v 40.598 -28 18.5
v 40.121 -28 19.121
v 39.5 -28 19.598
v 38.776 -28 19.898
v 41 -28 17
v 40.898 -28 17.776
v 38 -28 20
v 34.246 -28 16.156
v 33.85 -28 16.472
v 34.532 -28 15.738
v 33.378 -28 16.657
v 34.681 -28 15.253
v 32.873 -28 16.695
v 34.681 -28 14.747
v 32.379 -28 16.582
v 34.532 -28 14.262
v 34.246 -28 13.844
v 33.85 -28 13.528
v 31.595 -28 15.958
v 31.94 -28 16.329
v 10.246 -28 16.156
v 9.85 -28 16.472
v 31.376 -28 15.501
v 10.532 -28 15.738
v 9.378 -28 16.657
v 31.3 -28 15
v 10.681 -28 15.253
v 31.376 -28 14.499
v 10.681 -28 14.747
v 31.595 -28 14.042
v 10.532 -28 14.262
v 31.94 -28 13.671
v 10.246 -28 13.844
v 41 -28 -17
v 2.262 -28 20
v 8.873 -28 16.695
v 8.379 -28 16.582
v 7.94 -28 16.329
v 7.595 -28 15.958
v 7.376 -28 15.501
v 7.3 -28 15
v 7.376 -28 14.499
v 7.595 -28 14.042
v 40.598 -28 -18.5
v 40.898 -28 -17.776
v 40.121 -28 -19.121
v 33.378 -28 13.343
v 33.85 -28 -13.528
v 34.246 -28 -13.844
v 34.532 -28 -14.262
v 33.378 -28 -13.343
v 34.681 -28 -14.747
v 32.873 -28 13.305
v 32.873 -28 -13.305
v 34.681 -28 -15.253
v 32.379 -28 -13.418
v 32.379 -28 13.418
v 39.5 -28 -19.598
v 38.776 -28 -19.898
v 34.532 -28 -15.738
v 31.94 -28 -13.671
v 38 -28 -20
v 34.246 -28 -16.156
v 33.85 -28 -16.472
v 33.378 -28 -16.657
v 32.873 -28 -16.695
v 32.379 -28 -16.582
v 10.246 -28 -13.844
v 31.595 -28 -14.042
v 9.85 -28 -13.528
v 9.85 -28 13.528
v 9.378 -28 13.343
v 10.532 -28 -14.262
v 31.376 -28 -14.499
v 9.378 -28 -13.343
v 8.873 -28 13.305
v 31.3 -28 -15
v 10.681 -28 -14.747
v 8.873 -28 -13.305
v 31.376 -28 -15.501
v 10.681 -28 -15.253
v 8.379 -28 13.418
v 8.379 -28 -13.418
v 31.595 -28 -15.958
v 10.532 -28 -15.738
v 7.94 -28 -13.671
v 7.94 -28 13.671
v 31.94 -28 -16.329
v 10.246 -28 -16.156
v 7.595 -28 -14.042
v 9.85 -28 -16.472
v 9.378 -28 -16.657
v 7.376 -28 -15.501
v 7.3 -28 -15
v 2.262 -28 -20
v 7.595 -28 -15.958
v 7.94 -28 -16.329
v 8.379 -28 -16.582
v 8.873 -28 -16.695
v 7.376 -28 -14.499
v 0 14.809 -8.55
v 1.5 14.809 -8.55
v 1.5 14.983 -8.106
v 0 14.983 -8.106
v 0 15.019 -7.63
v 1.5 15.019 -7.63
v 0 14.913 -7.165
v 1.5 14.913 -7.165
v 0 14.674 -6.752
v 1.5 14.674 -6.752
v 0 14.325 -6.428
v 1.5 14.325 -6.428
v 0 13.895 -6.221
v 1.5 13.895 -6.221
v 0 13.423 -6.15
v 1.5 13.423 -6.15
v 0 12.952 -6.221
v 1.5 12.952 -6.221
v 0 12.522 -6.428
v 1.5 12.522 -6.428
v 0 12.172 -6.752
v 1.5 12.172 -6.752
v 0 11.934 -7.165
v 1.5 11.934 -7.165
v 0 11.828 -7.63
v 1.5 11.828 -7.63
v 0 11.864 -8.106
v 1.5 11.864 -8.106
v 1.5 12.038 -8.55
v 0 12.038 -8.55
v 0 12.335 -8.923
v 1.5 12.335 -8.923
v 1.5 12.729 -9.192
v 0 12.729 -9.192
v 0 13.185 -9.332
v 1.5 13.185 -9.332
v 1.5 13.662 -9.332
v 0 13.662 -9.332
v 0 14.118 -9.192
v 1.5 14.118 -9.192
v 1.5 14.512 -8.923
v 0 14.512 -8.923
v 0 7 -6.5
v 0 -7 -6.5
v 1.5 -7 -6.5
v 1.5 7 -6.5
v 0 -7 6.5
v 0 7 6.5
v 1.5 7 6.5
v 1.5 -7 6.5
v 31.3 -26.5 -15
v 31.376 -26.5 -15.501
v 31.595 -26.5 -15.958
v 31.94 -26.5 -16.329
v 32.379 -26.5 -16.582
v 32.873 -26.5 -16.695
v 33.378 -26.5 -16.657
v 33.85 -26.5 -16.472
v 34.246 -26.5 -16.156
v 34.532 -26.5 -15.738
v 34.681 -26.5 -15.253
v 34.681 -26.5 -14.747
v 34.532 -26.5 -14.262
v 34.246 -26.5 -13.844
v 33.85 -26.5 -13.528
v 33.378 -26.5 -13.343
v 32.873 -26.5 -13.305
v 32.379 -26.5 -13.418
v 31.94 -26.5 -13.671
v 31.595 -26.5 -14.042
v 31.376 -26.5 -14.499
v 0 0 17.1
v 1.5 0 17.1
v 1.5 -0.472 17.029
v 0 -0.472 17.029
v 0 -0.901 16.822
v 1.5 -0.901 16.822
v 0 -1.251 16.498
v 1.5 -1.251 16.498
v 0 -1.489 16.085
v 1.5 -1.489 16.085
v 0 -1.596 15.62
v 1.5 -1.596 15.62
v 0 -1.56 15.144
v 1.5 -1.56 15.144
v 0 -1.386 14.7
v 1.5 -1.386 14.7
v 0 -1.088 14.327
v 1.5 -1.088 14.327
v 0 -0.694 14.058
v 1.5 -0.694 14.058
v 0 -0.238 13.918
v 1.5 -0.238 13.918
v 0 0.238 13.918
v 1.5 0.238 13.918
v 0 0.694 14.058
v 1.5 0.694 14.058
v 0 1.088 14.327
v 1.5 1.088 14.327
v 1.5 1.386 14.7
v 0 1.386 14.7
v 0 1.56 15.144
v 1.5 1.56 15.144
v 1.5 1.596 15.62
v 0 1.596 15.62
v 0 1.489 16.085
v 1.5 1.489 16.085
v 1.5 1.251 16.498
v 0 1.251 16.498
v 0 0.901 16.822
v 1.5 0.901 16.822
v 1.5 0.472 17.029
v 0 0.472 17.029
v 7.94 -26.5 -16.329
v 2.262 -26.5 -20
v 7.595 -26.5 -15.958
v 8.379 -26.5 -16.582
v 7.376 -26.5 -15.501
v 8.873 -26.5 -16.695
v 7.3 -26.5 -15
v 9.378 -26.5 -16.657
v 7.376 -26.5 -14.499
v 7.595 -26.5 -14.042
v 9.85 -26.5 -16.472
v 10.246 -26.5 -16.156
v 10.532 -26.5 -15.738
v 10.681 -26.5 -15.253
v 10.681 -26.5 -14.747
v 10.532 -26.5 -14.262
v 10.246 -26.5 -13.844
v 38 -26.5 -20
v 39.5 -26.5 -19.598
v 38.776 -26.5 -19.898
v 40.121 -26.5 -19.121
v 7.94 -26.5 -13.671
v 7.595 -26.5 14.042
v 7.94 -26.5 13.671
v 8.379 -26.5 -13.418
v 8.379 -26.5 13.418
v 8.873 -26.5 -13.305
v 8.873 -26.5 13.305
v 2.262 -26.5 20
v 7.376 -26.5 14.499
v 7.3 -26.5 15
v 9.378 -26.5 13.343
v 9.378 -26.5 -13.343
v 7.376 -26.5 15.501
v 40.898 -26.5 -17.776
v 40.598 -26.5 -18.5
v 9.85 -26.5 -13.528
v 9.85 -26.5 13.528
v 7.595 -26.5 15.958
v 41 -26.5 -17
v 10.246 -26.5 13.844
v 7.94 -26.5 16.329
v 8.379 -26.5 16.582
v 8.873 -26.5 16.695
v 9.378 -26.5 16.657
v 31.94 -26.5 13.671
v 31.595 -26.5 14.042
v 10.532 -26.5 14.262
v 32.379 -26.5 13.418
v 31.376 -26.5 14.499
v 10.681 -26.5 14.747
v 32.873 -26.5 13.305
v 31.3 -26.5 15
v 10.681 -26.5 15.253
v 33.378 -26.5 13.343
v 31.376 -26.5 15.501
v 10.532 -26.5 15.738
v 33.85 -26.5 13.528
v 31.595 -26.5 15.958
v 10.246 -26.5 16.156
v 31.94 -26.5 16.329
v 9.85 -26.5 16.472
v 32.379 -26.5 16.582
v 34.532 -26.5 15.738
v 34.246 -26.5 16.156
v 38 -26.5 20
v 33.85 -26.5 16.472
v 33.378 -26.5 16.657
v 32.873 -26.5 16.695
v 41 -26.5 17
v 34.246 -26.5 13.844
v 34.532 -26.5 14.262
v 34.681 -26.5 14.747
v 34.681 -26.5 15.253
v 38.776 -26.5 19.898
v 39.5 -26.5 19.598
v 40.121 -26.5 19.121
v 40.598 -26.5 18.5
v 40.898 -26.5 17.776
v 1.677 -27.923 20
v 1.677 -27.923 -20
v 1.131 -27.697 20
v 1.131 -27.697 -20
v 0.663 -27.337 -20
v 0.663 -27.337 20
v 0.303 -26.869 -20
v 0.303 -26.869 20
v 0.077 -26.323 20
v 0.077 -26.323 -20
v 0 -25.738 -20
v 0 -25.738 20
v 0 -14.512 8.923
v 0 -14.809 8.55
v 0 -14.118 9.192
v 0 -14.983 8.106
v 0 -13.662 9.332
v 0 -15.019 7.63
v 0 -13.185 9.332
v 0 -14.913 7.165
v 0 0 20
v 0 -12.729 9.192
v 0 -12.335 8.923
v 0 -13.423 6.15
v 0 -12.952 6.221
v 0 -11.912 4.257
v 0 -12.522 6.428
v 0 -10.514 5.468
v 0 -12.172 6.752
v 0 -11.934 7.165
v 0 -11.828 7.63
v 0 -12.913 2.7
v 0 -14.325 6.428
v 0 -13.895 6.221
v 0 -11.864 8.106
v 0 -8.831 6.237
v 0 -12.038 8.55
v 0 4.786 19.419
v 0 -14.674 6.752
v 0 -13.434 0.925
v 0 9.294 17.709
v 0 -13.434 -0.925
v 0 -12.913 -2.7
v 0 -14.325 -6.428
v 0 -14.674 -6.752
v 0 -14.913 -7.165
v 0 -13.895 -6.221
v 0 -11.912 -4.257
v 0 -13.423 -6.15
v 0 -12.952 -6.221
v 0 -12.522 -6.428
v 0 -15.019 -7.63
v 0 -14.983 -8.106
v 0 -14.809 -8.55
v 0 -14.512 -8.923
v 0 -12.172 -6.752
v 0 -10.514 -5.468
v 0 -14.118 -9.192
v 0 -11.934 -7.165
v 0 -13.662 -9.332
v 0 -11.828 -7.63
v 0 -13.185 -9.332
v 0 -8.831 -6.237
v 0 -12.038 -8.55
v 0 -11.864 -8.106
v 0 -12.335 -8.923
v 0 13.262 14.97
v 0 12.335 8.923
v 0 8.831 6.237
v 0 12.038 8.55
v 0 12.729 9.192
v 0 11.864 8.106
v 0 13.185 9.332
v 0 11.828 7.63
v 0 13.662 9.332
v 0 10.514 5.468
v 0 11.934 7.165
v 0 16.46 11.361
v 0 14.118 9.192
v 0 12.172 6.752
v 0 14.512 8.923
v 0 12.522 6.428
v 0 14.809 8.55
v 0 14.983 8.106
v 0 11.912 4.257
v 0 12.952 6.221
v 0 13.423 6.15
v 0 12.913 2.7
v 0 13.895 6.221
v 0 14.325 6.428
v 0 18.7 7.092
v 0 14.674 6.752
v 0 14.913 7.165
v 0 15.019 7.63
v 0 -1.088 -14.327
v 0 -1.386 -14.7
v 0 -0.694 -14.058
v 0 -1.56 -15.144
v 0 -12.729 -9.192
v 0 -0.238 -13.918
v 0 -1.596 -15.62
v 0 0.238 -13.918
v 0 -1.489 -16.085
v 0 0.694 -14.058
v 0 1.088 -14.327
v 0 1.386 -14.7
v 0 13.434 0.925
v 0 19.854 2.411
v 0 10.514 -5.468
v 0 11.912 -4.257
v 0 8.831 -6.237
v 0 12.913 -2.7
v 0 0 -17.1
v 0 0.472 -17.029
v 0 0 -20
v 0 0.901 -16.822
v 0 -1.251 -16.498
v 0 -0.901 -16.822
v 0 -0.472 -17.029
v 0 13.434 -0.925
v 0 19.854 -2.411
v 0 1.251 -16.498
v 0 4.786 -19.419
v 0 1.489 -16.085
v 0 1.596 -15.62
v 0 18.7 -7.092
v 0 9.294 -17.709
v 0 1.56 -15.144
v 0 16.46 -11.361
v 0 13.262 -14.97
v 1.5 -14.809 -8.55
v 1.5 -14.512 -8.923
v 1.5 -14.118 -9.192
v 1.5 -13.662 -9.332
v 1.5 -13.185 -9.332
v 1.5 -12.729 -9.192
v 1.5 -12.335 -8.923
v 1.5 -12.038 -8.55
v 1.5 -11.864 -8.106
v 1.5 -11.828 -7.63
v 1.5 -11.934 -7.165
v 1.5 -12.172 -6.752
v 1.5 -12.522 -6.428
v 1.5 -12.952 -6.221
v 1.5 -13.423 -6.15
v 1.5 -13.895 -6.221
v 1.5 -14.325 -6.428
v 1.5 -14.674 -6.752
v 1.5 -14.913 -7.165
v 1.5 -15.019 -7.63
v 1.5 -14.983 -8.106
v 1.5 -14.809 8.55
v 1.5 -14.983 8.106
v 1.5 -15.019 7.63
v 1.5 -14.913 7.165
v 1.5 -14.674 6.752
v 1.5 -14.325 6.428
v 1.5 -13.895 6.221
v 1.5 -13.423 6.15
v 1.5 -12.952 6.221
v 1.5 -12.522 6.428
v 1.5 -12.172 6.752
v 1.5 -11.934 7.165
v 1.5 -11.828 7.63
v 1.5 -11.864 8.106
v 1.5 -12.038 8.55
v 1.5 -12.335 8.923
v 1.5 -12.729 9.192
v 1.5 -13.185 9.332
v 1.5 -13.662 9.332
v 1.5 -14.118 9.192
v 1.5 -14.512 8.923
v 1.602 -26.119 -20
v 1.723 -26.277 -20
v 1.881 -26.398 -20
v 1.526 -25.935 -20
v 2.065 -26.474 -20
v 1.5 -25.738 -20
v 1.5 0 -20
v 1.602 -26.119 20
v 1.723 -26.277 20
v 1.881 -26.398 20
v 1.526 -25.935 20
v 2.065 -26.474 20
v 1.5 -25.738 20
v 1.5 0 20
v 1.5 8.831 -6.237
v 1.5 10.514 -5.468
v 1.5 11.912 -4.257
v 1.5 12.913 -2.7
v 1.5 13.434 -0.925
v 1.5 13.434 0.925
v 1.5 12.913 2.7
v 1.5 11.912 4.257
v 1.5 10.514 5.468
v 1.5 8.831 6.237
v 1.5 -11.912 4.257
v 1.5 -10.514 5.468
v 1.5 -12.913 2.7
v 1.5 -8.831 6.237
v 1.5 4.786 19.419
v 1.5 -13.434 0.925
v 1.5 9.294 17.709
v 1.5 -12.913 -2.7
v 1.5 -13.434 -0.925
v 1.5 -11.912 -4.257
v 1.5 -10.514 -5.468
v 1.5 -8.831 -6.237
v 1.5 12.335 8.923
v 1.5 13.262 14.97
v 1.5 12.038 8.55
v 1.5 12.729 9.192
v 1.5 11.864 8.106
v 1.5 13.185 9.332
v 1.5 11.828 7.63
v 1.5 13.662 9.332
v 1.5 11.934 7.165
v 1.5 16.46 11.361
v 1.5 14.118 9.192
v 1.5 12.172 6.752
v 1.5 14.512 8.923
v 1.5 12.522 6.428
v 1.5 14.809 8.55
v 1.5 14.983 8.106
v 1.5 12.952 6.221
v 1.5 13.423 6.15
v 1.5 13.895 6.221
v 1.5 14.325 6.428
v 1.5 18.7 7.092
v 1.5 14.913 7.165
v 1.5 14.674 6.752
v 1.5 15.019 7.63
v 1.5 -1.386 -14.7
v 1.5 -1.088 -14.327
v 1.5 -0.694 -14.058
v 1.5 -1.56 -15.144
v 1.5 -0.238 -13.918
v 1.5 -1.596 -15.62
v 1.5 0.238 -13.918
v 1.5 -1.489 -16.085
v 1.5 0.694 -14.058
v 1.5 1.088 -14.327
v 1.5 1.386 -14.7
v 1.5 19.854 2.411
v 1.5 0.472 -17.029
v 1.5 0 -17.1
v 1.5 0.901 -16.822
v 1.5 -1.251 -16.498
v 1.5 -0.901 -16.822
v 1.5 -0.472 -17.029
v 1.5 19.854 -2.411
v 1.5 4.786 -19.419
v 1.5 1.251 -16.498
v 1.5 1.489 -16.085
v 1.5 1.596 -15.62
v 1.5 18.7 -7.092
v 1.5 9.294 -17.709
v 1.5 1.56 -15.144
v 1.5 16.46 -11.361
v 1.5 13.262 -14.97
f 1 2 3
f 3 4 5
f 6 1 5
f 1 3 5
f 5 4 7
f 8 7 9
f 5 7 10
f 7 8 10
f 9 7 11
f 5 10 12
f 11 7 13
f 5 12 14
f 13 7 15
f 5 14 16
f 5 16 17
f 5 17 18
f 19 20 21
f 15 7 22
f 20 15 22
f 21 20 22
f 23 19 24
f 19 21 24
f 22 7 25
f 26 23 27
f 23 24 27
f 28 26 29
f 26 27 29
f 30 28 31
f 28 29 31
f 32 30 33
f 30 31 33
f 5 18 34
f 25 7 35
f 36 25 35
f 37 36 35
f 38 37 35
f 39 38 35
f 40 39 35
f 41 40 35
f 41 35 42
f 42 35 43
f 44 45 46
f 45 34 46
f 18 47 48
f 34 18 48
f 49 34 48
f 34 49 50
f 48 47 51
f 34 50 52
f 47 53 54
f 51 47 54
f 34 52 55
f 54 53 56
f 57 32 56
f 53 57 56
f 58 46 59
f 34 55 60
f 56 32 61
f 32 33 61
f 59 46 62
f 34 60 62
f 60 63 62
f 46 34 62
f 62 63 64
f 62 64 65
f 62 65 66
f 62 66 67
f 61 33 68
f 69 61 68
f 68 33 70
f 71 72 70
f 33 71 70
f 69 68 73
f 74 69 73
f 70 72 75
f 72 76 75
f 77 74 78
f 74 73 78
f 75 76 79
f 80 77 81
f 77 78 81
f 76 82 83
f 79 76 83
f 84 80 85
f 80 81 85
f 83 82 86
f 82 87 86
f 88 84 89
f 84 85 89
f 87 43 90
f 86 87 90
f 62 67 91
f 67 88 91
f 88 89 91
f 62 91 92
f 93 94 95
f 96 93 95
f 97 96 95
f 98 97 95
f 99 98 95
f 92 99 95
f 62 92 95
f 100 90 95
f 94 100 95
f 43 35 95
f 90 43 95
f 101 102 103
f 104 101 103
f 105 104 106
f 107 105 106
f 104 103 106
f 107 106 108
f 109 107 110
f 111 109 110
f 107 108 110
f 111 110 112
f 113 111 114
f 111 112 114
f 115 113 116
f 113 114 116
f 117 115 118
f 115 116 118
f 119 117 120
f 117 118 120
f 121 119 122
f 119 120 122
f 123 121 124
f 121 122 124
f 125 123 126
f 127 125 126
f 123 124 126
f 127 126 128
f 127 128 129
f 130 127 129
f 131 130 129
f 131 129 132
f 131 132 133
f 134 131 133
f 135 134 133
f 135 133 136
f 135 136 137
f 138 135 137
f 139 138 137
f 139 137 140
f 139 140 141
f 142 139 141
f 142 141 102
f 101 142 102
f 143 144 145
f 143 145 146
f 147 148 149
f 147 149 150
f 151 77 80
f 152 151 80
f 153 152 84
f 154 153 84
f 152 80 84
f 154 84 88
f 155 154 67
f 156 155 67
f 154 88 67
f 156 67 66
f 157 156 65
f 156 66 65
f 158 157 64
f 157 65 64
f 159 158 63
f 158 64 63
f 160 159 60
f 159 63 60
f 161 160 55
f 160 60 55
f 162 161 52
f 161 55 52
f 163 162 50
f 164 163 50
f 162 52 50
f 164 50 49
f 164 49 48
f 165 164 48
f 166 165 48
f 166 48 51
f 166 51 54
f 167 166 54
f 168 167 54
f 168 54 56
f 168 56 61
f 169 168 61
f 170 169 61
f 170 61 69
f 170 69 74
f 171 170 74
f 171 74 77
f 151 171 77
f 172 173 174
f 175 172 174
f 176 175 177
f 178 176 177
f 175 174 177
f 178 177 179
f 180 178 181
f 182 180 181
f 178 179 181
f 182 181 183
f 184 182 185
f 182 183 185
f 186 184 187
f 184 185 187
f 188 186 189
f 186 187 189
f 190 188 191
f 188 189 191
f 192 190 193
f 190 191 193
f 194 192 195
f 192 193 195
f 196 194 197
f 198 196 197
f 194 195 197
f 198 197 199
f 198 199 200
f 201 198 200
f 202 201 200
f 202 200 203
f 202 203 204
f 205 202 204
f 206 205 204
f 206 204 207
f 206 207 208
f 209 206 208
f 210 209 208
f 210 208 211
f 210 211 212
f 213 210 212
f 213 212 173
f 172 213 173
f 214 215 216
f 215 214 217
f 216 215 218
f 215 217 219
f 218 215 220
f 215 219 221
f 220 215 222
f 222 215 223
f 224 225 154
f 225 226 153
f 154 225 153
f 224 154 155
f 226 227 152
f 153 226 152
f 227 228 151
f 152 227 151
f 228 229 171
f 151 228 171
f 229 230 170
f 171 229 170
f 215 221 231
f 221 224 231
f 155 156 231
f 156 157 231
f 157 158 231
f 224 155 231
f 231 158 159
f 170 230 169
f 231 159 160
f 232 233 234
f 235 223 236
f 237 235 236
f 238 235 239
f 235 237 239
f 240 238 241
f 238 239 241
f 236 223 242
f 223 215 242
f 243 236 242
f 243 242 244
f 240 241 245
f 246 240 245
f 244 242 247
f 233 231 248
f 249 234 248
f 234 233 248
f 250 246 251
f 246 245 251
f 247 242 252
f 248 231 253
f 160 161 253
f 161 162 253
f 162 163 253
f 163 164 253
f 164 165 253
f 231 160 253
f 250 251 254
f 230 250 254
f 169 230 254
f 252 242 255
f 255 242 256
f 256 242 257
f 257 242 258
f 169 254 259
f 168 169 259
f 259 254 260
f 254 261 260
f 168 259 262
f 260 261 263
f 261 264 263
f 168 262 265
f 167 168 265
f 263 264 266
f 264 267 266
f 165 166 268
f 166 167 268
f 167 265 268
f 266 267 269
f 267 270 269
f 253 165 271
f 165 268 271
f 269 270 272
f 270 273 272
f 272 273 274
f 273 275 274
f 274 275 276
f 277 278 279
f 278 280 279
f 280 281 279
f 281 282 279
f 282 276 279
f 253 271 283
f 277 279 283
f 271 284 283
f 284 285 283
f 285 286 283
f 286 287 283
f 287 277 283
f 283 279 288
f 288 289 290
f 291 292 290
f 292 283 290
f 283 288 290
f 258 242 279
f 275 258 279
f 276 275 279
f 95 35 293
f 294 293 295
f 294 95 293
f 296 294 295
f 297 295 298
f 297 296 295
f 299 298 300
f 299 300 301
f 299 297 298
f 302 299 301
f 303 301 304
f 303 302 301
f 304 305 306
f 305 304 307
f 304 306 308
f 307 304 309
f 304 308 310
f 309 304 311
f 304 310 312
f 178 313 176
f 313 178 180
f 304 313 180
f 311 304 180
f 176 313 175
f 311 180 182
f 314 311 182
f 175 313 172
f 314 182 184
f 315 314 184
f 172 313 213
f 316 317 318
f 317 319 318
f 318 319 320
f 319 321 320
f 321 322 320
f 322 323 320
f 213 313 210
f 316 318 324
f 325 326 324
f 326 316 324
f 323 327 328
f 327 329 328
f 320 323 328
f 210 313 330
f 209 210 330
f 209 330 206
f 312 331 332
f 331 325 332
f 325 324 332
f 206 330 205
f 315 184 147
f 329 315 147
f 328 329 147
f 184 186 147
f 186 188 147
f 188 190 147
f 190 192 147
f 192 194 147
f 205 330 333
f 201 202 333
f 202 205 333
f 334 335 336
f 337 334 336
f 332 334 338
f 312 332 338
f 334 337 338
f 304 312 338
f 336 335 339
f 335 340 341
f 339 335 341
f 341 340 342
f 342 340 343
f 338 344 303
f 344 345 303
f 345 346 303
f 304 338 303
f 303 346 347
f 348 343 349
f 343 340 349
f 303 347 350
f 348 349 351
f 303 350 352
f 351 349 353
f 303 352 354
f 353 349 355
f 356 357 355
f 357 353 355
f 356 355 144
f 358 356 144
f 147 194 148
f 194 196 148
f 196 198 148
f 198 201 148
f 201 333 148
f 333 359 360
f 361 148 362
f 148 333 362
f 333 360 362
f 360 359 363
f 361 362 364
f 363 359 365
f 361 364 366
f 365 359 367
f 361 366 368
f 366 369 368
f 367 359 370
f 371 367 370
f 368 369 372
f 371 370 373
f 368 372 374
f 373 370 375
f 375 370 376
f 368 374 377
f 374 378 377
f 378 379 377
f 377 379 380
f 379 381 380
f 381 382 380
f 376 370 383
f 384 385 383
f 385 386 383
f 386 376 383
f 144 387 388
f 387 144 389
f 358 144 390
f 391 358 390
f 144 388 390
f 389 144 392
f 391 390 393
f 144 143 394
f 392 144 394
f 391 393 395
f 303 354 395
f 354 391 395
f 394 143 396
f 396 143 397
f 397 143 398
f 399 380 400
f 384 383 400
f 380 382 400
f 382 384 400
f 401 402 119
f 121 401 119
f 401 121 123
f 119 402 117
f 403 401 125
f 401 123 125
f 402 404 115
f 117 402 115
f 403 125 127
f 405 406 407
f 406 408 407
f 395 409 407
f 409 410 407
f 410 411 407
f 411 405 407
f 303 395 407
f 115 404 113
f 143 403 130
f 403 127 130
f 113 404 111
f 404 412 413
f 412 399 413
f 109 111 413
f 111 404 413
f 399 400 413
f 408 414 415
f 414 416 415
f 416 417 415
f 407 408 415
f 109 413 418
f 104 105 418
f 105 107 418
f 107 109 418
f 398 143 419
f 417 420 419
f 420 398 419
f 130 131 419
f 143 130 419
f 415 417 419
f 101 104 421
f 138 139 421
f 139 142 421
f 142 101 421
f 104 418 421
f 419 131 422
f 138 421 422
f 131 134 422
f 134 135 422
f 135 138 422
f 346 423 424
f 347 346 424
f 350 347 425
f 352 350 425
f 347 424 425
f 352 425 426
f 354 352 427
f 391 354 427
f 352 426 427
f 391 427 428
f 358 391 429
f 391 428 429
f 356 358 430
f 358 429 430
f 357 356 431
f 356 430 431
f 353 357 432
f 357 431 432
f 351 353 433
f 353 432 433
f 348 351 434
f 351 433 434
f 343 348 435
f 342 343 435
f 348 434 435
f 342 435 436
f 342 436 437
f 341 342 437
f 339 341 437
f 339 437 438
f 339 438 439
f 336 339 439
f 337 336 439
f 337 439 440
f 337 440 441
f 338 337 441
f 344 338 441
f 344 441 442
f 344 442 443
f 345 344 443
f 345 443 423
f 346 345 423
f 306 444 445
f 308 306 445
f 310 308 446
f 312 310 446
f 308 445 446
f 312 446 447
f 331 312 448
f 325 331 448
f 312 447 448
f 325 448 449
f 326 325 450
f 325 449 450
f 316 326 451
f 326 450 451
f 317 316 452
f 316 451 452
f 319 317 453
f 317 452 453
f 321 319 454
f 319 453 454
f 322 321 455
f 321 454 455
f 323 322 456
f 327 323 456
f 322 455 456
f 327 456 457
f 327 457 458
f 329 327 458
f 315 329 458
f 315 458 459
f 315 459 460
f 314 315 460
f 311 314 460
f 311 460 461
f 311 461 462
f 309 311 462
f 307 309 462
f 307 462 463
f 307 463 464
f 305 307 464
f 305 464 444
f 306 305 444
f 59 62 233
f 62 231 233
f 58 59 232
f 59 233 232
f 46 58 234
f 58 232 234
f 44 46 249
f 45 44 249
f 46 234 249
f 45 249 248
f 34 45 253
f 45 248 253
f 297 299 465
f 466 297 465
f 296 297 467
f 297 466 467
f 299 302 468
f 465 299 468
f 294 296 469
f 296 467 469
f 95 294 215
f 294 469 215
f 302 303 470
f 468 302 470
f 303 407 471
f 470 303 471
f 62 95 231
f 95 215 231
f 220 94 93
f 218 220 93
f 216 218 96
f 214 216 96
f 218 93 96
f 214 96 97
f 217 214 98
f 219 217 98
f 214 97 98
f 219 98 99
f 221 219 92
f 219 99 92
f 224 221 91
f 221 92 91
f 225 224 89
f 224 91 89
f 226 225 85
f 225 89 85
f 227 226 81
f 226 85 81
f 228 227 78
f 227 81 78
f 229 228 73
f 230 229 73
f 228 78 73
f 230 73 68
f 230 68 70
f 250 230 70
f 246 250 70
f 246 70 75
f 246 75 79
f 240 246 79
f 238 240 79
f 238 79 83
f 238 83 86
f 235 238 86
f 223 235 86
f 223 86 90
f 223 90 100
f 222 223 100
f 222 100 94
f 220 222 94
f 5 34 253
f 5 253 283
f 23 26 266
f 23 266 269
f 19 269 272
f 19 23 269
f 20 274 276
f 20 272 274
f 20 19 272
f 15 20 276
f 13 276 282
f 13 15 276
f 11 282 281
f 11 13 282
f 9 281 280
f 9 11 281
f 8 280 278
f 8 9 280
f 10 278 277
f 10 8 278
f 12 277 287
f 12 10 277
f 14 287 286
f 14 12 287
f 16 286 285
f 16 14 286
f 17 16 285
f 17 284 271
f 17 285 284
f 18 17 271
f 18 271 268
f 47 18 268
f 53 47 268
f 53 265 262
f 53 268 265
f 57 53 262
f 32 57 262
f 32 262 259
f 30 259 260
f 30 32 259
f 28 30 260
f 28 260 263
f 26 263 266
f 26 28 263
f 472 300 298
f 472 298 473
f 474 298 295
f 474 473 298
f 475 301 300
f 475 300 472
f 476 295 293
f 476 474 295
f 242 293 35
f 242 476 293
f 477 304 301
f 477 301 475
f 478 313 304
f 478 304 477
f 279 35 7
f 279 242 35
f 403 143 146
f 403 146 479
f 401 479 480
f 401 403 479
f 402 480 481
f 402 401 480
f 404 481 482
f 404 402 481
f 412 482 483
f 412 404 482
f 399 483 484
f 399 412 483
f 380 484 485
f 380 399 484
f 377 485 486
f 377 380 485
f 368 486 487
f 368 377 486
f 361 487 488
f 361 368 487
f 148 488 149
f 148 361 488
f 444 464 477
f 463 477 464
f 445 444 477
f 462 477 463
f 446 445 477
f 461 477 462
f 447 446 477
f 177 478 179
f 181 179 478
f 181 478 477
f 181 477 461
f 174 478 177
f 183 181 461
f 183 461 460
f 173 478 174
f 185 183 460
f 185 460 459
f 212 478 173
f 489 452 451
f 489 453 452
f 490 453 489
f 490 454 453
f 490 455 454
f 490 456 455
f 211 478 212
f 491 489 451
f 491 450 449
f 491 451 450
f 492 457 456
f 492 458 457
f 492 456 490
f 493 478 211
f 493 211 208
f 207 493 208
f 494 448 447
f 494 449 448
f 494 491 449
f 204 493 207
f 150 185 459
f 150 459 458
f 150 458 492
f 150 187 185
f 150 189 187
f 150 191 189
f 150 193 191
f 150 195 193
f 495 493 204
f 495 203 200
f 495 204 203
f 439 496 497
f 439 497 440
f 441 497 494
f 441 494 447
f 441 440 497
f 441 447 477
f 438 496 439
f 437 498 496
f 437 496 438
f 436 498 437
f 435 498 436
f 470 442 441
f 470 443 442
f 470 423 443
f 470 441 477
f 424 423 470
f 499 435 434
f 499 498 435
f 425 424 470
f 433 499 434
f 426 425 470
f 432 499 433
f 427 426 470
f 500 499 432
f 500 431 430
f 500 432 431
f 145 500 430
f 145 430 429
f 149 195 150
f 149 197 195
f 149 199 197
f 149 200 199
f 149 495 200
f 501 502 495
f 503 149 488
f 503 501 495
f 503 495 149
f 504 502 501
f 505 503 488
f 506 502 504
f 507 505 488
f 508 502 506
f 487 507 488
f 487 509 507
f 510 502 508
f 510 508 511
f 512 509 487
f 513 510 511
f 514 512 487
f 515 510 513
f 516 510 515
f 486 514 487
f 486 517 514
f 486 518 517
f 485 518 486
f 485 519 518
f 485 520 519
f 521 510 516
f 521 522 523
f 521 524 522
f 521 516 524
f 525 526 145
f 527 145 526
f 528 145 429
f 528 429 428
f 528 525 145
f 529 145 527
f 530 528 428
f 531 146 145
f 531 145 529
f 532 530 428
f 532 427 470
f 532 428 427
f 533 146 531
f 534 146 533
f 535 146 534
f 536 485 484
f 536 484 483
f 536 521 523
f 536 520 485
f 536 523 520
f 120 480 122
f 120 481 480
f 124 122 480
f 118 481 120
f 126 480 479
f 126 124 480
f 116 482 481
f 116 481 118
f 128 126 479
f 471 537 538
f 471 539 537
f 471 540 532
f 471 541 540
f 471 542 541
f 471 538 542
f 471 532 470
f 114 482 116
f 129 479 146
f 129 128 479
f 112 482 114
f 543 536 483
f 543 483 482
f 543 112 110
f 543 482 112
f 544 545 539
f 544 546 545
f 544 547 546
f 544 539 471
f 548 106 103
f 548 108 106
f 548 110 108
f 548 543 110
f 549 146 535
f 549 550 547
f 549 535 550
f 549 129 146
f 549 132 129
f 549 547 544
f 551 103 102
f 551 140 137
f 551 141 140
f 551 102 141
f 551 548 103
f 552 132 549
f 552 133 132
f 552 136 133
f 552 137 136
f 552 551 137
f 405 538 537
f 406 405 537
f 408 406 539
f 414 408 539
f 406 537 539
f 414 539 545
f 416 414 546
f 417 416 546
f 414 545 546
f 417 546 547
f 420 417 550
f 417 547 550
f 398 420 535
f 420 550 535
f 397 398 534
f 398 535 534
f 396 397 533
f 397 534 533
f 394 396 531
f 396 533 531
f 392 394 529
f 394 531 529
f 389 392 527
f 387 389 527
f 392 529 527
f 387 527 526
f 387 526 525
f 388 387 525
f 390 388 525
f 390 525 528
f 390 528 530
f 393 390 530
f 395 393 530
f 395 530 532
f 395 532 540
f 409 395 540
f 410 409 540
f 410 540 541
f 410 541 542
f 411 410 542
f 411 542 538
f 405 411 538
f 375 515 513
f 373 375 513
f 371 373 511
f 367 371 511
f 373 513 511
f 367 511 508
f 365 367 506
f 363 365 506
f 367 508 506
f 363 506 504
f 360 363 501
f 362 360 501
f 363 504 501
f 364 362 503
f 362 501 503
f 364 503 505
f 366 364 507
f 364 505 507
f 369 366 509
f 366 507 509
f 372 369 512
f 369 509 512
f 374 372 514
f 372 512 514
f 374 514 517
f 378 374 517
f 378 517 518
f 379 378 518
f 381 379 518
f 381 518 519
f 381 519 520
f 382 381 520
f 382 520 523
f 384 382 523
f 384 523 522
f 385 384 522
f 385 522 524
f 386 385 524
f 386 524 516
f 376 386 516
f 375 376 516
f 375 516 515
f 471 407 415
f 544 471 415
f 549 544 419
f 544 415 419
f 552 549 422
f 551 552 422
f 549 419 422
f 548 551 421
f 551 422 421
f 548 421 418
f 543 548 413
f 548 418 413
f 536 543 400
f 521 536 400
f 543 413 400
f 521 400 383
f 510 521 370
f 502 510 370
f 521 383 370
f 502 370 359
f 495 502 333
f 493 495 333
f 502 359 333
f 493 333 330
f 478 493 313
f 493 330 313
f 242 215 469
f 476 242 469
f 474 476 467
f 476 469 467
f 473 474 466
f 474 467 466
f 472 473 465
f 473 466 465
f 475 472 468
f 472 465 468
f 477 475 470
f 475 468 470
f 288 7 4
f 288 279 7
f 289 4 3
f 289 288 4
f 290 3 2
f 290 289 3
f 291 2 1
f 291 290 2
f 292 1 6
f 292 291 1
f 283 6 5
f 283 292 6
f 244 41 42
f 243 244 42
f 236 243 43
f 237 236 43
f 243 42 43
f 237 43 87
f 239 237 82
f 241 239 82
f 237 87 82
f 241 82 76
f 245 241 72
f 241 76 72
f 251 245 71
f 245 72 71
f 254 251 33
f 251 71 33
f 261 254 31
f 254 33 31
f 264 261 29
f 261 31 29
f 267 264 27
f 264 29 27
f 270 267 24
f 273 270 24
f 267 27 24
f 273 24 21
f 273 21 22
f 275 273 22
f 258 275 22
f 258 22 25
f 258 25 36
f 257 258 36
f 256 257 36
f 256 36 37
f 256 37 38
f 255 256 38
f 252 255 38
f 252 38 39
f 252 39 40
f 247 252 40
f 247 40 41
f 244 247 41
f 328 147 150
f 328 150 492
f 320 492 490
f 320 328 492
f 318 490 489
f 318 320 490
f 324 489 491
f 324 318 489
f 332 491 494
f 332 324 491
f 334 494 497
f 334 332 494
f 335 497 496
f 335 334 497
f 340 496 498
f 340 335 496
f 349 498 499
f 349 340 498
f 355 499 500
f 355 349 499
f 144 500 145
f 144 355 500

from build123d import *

# Parameters (mm, degrees)
BOSS_EXTRUDE1_DEPTH    = 1.5
SKETCH2_W              = 41
SKETCH2_H              = 40
BOSS_EXTRUDE2_DEPTH    = 1.5
CONVERT_SOLID1_START   = -20
CONVERT_SOLID1_DEPTH   = 40
CONVERT_SOLID1_2_DEPTH = 40
M3_CLEARANCE_HOLE1_D   = 3.2
CIRPATTERN1_COUNT      = 6
CUT_EXTRUDE1_DEPTH     = 54.525694764
M3_CLEARANCE_HOLE2_D   = 3.4
LPATTERN1_COUNT        = 2
LPATTERN1_PITCH        = 24
LPATTERN1_COPY_1_D     = 3.4
FILLET1_R              = 3


# Read off the part's stored shape, not the designer's step: Convert-Solid1
with BuildPart() as part:
    # Sketch1 → Boss-Extrude1 (new body)
    with BuildSketch(Plane(origin=(0, 0, 0), x_dir=(0, 0, -1), z_dir=(1, 0, 0))):
        with BuildLine():
            Line((-20, 0), (-20, -28))
            Line((-20, -28), (20, -28))
            Line((20, -28), (20, 0))
            ThreePointArc((20, 0), (0, 20), (-20, 0))
        make_face()
    extrude(amount=BOSS_EXTRUDE1_DEPTH)

    # Sketch2 → Boss-Extrude2 (add)
    with BuildSketch(Plane.XZ.offset(28)):
        with Locations((20.5, 0)):
            Rectangle(SKETCH2_W, SKETCH2_H)
    extrude(amount=-BOSS_EXTRUDE2_DEPTH)

    # Convert-Solid1 outline → Convert-Solid1 (cut)
    with BuildSketch(Plane.XY.offset(CONVERT_SOLID1_START)):
        with BuildLine():
            Line((0, -28), (2.262, -28))
            ThreePointArc((2.262, -28), (0.662524461, -27.337475539), (0, -25.738))
            Line((0, -25.738), (0, -28))
        make_face()
    extrude(amount=CONVERT_SOLID1_DEPTH, mode=Mode.SUBTRACT)

    # Convert-Solid1 2 outline → Convert-Solid1 2 (add)
    with BuildSketch(Plane.XY.offset(CONVERT_SOLID1_START)):
        with BuildLine():
            Line((1.5, -26.5), (2.262, -26.5))
            ThreePointArc((2.262, -26.5), (1.723184633, -26.276815367), (1.5, -25.738))
            Line((1.5, -25.738), (1.5, -26.5))
        make_face()
    extrude(amount=CONVERT_SOLID1_2_DEPTH)

    # M3 Clearance Hole1 (through all)
    with Locations(Plane.ZY):
        with Locations((-15.5, 0)):
            m3_clearance_hole1 = Hole(M3_CLEARANCE_HOLE1_D / 2)

    # CirPattern1: M3 Clearance Hole1 ×6 about axis
    cirpattern1_axis = Axis((0, 0, 0), (1, 0, 0))
    for i in range(1, CIRPATTERN1_COUNT):
        add(m3_clearance_hole1.rotate(cirpattern1_axis, i * 360 / CIRPATTERN1_COUNT), mode=Mode.SUBTRACT)

    # Sketch9 → Cut-Extrude1 (cut, through all)
    with BuildSketch(Plane.ZY):
        with BuildLine():
            Line((6.5, 7), (6.5, -7))
            ThreePointArc((6.5, -7), (0, -13.5), (-6.5, -7))
            Line((-6.5, -7), (-6.5, 7))
            ThreePointArc((-6.5, 7), (0, 13.5), (6.5, 7))
        make_face()
    extrude(amount=-CUT_EXTRUDE1_DEPTH, mode=Mode.SUBTRACT)

    # M3 Clearance Hole2 (through all)
    with Locations(Plane(origin=(0, -26.5, 0), x_dir=(1, 0, 0), z_dir=(0, 1, 0))):
        with Locations((33, 15)):
            m3_clearance_hole2 = Hole(M3_CLEARANCE_HOLE2_D / 2)

    # Mirror1: M3 Clearance Hole2 across plane
    add(m3_clearance_hole2.mirror(Plane.XY), mode=Mode.SUBTRACT)

    # LPattern1: M3 Clearance Hole2 ×2
    with Locations(*[(-i * LPATTERN1_PITCH, 0, 0) for i in range(1, LPATTERN1_COUNT)]):
        add(m3_clearance_hole2, mode=Mode.SUBTRACT)

    # LPattern1 copy 1 (through all)
    with Locations(Plane(origin=(-24, -26.5, 0), x_dir=(1, 0, 0), z_dir=(0, 1, 0))):
        with Locations((33, -15)):
            Hole(LPATTERN1_COPY_1_D / 2)

    # Fillet1
    fillet1_edges = [part.edges().sort_by_distance(p)[0] for p in [
        (41, -27.25, 20),
        (41, -27.25, -20),
    ]]
    fillet(fillet1_edges, radius=FILLET1_R)


solid = part.part
